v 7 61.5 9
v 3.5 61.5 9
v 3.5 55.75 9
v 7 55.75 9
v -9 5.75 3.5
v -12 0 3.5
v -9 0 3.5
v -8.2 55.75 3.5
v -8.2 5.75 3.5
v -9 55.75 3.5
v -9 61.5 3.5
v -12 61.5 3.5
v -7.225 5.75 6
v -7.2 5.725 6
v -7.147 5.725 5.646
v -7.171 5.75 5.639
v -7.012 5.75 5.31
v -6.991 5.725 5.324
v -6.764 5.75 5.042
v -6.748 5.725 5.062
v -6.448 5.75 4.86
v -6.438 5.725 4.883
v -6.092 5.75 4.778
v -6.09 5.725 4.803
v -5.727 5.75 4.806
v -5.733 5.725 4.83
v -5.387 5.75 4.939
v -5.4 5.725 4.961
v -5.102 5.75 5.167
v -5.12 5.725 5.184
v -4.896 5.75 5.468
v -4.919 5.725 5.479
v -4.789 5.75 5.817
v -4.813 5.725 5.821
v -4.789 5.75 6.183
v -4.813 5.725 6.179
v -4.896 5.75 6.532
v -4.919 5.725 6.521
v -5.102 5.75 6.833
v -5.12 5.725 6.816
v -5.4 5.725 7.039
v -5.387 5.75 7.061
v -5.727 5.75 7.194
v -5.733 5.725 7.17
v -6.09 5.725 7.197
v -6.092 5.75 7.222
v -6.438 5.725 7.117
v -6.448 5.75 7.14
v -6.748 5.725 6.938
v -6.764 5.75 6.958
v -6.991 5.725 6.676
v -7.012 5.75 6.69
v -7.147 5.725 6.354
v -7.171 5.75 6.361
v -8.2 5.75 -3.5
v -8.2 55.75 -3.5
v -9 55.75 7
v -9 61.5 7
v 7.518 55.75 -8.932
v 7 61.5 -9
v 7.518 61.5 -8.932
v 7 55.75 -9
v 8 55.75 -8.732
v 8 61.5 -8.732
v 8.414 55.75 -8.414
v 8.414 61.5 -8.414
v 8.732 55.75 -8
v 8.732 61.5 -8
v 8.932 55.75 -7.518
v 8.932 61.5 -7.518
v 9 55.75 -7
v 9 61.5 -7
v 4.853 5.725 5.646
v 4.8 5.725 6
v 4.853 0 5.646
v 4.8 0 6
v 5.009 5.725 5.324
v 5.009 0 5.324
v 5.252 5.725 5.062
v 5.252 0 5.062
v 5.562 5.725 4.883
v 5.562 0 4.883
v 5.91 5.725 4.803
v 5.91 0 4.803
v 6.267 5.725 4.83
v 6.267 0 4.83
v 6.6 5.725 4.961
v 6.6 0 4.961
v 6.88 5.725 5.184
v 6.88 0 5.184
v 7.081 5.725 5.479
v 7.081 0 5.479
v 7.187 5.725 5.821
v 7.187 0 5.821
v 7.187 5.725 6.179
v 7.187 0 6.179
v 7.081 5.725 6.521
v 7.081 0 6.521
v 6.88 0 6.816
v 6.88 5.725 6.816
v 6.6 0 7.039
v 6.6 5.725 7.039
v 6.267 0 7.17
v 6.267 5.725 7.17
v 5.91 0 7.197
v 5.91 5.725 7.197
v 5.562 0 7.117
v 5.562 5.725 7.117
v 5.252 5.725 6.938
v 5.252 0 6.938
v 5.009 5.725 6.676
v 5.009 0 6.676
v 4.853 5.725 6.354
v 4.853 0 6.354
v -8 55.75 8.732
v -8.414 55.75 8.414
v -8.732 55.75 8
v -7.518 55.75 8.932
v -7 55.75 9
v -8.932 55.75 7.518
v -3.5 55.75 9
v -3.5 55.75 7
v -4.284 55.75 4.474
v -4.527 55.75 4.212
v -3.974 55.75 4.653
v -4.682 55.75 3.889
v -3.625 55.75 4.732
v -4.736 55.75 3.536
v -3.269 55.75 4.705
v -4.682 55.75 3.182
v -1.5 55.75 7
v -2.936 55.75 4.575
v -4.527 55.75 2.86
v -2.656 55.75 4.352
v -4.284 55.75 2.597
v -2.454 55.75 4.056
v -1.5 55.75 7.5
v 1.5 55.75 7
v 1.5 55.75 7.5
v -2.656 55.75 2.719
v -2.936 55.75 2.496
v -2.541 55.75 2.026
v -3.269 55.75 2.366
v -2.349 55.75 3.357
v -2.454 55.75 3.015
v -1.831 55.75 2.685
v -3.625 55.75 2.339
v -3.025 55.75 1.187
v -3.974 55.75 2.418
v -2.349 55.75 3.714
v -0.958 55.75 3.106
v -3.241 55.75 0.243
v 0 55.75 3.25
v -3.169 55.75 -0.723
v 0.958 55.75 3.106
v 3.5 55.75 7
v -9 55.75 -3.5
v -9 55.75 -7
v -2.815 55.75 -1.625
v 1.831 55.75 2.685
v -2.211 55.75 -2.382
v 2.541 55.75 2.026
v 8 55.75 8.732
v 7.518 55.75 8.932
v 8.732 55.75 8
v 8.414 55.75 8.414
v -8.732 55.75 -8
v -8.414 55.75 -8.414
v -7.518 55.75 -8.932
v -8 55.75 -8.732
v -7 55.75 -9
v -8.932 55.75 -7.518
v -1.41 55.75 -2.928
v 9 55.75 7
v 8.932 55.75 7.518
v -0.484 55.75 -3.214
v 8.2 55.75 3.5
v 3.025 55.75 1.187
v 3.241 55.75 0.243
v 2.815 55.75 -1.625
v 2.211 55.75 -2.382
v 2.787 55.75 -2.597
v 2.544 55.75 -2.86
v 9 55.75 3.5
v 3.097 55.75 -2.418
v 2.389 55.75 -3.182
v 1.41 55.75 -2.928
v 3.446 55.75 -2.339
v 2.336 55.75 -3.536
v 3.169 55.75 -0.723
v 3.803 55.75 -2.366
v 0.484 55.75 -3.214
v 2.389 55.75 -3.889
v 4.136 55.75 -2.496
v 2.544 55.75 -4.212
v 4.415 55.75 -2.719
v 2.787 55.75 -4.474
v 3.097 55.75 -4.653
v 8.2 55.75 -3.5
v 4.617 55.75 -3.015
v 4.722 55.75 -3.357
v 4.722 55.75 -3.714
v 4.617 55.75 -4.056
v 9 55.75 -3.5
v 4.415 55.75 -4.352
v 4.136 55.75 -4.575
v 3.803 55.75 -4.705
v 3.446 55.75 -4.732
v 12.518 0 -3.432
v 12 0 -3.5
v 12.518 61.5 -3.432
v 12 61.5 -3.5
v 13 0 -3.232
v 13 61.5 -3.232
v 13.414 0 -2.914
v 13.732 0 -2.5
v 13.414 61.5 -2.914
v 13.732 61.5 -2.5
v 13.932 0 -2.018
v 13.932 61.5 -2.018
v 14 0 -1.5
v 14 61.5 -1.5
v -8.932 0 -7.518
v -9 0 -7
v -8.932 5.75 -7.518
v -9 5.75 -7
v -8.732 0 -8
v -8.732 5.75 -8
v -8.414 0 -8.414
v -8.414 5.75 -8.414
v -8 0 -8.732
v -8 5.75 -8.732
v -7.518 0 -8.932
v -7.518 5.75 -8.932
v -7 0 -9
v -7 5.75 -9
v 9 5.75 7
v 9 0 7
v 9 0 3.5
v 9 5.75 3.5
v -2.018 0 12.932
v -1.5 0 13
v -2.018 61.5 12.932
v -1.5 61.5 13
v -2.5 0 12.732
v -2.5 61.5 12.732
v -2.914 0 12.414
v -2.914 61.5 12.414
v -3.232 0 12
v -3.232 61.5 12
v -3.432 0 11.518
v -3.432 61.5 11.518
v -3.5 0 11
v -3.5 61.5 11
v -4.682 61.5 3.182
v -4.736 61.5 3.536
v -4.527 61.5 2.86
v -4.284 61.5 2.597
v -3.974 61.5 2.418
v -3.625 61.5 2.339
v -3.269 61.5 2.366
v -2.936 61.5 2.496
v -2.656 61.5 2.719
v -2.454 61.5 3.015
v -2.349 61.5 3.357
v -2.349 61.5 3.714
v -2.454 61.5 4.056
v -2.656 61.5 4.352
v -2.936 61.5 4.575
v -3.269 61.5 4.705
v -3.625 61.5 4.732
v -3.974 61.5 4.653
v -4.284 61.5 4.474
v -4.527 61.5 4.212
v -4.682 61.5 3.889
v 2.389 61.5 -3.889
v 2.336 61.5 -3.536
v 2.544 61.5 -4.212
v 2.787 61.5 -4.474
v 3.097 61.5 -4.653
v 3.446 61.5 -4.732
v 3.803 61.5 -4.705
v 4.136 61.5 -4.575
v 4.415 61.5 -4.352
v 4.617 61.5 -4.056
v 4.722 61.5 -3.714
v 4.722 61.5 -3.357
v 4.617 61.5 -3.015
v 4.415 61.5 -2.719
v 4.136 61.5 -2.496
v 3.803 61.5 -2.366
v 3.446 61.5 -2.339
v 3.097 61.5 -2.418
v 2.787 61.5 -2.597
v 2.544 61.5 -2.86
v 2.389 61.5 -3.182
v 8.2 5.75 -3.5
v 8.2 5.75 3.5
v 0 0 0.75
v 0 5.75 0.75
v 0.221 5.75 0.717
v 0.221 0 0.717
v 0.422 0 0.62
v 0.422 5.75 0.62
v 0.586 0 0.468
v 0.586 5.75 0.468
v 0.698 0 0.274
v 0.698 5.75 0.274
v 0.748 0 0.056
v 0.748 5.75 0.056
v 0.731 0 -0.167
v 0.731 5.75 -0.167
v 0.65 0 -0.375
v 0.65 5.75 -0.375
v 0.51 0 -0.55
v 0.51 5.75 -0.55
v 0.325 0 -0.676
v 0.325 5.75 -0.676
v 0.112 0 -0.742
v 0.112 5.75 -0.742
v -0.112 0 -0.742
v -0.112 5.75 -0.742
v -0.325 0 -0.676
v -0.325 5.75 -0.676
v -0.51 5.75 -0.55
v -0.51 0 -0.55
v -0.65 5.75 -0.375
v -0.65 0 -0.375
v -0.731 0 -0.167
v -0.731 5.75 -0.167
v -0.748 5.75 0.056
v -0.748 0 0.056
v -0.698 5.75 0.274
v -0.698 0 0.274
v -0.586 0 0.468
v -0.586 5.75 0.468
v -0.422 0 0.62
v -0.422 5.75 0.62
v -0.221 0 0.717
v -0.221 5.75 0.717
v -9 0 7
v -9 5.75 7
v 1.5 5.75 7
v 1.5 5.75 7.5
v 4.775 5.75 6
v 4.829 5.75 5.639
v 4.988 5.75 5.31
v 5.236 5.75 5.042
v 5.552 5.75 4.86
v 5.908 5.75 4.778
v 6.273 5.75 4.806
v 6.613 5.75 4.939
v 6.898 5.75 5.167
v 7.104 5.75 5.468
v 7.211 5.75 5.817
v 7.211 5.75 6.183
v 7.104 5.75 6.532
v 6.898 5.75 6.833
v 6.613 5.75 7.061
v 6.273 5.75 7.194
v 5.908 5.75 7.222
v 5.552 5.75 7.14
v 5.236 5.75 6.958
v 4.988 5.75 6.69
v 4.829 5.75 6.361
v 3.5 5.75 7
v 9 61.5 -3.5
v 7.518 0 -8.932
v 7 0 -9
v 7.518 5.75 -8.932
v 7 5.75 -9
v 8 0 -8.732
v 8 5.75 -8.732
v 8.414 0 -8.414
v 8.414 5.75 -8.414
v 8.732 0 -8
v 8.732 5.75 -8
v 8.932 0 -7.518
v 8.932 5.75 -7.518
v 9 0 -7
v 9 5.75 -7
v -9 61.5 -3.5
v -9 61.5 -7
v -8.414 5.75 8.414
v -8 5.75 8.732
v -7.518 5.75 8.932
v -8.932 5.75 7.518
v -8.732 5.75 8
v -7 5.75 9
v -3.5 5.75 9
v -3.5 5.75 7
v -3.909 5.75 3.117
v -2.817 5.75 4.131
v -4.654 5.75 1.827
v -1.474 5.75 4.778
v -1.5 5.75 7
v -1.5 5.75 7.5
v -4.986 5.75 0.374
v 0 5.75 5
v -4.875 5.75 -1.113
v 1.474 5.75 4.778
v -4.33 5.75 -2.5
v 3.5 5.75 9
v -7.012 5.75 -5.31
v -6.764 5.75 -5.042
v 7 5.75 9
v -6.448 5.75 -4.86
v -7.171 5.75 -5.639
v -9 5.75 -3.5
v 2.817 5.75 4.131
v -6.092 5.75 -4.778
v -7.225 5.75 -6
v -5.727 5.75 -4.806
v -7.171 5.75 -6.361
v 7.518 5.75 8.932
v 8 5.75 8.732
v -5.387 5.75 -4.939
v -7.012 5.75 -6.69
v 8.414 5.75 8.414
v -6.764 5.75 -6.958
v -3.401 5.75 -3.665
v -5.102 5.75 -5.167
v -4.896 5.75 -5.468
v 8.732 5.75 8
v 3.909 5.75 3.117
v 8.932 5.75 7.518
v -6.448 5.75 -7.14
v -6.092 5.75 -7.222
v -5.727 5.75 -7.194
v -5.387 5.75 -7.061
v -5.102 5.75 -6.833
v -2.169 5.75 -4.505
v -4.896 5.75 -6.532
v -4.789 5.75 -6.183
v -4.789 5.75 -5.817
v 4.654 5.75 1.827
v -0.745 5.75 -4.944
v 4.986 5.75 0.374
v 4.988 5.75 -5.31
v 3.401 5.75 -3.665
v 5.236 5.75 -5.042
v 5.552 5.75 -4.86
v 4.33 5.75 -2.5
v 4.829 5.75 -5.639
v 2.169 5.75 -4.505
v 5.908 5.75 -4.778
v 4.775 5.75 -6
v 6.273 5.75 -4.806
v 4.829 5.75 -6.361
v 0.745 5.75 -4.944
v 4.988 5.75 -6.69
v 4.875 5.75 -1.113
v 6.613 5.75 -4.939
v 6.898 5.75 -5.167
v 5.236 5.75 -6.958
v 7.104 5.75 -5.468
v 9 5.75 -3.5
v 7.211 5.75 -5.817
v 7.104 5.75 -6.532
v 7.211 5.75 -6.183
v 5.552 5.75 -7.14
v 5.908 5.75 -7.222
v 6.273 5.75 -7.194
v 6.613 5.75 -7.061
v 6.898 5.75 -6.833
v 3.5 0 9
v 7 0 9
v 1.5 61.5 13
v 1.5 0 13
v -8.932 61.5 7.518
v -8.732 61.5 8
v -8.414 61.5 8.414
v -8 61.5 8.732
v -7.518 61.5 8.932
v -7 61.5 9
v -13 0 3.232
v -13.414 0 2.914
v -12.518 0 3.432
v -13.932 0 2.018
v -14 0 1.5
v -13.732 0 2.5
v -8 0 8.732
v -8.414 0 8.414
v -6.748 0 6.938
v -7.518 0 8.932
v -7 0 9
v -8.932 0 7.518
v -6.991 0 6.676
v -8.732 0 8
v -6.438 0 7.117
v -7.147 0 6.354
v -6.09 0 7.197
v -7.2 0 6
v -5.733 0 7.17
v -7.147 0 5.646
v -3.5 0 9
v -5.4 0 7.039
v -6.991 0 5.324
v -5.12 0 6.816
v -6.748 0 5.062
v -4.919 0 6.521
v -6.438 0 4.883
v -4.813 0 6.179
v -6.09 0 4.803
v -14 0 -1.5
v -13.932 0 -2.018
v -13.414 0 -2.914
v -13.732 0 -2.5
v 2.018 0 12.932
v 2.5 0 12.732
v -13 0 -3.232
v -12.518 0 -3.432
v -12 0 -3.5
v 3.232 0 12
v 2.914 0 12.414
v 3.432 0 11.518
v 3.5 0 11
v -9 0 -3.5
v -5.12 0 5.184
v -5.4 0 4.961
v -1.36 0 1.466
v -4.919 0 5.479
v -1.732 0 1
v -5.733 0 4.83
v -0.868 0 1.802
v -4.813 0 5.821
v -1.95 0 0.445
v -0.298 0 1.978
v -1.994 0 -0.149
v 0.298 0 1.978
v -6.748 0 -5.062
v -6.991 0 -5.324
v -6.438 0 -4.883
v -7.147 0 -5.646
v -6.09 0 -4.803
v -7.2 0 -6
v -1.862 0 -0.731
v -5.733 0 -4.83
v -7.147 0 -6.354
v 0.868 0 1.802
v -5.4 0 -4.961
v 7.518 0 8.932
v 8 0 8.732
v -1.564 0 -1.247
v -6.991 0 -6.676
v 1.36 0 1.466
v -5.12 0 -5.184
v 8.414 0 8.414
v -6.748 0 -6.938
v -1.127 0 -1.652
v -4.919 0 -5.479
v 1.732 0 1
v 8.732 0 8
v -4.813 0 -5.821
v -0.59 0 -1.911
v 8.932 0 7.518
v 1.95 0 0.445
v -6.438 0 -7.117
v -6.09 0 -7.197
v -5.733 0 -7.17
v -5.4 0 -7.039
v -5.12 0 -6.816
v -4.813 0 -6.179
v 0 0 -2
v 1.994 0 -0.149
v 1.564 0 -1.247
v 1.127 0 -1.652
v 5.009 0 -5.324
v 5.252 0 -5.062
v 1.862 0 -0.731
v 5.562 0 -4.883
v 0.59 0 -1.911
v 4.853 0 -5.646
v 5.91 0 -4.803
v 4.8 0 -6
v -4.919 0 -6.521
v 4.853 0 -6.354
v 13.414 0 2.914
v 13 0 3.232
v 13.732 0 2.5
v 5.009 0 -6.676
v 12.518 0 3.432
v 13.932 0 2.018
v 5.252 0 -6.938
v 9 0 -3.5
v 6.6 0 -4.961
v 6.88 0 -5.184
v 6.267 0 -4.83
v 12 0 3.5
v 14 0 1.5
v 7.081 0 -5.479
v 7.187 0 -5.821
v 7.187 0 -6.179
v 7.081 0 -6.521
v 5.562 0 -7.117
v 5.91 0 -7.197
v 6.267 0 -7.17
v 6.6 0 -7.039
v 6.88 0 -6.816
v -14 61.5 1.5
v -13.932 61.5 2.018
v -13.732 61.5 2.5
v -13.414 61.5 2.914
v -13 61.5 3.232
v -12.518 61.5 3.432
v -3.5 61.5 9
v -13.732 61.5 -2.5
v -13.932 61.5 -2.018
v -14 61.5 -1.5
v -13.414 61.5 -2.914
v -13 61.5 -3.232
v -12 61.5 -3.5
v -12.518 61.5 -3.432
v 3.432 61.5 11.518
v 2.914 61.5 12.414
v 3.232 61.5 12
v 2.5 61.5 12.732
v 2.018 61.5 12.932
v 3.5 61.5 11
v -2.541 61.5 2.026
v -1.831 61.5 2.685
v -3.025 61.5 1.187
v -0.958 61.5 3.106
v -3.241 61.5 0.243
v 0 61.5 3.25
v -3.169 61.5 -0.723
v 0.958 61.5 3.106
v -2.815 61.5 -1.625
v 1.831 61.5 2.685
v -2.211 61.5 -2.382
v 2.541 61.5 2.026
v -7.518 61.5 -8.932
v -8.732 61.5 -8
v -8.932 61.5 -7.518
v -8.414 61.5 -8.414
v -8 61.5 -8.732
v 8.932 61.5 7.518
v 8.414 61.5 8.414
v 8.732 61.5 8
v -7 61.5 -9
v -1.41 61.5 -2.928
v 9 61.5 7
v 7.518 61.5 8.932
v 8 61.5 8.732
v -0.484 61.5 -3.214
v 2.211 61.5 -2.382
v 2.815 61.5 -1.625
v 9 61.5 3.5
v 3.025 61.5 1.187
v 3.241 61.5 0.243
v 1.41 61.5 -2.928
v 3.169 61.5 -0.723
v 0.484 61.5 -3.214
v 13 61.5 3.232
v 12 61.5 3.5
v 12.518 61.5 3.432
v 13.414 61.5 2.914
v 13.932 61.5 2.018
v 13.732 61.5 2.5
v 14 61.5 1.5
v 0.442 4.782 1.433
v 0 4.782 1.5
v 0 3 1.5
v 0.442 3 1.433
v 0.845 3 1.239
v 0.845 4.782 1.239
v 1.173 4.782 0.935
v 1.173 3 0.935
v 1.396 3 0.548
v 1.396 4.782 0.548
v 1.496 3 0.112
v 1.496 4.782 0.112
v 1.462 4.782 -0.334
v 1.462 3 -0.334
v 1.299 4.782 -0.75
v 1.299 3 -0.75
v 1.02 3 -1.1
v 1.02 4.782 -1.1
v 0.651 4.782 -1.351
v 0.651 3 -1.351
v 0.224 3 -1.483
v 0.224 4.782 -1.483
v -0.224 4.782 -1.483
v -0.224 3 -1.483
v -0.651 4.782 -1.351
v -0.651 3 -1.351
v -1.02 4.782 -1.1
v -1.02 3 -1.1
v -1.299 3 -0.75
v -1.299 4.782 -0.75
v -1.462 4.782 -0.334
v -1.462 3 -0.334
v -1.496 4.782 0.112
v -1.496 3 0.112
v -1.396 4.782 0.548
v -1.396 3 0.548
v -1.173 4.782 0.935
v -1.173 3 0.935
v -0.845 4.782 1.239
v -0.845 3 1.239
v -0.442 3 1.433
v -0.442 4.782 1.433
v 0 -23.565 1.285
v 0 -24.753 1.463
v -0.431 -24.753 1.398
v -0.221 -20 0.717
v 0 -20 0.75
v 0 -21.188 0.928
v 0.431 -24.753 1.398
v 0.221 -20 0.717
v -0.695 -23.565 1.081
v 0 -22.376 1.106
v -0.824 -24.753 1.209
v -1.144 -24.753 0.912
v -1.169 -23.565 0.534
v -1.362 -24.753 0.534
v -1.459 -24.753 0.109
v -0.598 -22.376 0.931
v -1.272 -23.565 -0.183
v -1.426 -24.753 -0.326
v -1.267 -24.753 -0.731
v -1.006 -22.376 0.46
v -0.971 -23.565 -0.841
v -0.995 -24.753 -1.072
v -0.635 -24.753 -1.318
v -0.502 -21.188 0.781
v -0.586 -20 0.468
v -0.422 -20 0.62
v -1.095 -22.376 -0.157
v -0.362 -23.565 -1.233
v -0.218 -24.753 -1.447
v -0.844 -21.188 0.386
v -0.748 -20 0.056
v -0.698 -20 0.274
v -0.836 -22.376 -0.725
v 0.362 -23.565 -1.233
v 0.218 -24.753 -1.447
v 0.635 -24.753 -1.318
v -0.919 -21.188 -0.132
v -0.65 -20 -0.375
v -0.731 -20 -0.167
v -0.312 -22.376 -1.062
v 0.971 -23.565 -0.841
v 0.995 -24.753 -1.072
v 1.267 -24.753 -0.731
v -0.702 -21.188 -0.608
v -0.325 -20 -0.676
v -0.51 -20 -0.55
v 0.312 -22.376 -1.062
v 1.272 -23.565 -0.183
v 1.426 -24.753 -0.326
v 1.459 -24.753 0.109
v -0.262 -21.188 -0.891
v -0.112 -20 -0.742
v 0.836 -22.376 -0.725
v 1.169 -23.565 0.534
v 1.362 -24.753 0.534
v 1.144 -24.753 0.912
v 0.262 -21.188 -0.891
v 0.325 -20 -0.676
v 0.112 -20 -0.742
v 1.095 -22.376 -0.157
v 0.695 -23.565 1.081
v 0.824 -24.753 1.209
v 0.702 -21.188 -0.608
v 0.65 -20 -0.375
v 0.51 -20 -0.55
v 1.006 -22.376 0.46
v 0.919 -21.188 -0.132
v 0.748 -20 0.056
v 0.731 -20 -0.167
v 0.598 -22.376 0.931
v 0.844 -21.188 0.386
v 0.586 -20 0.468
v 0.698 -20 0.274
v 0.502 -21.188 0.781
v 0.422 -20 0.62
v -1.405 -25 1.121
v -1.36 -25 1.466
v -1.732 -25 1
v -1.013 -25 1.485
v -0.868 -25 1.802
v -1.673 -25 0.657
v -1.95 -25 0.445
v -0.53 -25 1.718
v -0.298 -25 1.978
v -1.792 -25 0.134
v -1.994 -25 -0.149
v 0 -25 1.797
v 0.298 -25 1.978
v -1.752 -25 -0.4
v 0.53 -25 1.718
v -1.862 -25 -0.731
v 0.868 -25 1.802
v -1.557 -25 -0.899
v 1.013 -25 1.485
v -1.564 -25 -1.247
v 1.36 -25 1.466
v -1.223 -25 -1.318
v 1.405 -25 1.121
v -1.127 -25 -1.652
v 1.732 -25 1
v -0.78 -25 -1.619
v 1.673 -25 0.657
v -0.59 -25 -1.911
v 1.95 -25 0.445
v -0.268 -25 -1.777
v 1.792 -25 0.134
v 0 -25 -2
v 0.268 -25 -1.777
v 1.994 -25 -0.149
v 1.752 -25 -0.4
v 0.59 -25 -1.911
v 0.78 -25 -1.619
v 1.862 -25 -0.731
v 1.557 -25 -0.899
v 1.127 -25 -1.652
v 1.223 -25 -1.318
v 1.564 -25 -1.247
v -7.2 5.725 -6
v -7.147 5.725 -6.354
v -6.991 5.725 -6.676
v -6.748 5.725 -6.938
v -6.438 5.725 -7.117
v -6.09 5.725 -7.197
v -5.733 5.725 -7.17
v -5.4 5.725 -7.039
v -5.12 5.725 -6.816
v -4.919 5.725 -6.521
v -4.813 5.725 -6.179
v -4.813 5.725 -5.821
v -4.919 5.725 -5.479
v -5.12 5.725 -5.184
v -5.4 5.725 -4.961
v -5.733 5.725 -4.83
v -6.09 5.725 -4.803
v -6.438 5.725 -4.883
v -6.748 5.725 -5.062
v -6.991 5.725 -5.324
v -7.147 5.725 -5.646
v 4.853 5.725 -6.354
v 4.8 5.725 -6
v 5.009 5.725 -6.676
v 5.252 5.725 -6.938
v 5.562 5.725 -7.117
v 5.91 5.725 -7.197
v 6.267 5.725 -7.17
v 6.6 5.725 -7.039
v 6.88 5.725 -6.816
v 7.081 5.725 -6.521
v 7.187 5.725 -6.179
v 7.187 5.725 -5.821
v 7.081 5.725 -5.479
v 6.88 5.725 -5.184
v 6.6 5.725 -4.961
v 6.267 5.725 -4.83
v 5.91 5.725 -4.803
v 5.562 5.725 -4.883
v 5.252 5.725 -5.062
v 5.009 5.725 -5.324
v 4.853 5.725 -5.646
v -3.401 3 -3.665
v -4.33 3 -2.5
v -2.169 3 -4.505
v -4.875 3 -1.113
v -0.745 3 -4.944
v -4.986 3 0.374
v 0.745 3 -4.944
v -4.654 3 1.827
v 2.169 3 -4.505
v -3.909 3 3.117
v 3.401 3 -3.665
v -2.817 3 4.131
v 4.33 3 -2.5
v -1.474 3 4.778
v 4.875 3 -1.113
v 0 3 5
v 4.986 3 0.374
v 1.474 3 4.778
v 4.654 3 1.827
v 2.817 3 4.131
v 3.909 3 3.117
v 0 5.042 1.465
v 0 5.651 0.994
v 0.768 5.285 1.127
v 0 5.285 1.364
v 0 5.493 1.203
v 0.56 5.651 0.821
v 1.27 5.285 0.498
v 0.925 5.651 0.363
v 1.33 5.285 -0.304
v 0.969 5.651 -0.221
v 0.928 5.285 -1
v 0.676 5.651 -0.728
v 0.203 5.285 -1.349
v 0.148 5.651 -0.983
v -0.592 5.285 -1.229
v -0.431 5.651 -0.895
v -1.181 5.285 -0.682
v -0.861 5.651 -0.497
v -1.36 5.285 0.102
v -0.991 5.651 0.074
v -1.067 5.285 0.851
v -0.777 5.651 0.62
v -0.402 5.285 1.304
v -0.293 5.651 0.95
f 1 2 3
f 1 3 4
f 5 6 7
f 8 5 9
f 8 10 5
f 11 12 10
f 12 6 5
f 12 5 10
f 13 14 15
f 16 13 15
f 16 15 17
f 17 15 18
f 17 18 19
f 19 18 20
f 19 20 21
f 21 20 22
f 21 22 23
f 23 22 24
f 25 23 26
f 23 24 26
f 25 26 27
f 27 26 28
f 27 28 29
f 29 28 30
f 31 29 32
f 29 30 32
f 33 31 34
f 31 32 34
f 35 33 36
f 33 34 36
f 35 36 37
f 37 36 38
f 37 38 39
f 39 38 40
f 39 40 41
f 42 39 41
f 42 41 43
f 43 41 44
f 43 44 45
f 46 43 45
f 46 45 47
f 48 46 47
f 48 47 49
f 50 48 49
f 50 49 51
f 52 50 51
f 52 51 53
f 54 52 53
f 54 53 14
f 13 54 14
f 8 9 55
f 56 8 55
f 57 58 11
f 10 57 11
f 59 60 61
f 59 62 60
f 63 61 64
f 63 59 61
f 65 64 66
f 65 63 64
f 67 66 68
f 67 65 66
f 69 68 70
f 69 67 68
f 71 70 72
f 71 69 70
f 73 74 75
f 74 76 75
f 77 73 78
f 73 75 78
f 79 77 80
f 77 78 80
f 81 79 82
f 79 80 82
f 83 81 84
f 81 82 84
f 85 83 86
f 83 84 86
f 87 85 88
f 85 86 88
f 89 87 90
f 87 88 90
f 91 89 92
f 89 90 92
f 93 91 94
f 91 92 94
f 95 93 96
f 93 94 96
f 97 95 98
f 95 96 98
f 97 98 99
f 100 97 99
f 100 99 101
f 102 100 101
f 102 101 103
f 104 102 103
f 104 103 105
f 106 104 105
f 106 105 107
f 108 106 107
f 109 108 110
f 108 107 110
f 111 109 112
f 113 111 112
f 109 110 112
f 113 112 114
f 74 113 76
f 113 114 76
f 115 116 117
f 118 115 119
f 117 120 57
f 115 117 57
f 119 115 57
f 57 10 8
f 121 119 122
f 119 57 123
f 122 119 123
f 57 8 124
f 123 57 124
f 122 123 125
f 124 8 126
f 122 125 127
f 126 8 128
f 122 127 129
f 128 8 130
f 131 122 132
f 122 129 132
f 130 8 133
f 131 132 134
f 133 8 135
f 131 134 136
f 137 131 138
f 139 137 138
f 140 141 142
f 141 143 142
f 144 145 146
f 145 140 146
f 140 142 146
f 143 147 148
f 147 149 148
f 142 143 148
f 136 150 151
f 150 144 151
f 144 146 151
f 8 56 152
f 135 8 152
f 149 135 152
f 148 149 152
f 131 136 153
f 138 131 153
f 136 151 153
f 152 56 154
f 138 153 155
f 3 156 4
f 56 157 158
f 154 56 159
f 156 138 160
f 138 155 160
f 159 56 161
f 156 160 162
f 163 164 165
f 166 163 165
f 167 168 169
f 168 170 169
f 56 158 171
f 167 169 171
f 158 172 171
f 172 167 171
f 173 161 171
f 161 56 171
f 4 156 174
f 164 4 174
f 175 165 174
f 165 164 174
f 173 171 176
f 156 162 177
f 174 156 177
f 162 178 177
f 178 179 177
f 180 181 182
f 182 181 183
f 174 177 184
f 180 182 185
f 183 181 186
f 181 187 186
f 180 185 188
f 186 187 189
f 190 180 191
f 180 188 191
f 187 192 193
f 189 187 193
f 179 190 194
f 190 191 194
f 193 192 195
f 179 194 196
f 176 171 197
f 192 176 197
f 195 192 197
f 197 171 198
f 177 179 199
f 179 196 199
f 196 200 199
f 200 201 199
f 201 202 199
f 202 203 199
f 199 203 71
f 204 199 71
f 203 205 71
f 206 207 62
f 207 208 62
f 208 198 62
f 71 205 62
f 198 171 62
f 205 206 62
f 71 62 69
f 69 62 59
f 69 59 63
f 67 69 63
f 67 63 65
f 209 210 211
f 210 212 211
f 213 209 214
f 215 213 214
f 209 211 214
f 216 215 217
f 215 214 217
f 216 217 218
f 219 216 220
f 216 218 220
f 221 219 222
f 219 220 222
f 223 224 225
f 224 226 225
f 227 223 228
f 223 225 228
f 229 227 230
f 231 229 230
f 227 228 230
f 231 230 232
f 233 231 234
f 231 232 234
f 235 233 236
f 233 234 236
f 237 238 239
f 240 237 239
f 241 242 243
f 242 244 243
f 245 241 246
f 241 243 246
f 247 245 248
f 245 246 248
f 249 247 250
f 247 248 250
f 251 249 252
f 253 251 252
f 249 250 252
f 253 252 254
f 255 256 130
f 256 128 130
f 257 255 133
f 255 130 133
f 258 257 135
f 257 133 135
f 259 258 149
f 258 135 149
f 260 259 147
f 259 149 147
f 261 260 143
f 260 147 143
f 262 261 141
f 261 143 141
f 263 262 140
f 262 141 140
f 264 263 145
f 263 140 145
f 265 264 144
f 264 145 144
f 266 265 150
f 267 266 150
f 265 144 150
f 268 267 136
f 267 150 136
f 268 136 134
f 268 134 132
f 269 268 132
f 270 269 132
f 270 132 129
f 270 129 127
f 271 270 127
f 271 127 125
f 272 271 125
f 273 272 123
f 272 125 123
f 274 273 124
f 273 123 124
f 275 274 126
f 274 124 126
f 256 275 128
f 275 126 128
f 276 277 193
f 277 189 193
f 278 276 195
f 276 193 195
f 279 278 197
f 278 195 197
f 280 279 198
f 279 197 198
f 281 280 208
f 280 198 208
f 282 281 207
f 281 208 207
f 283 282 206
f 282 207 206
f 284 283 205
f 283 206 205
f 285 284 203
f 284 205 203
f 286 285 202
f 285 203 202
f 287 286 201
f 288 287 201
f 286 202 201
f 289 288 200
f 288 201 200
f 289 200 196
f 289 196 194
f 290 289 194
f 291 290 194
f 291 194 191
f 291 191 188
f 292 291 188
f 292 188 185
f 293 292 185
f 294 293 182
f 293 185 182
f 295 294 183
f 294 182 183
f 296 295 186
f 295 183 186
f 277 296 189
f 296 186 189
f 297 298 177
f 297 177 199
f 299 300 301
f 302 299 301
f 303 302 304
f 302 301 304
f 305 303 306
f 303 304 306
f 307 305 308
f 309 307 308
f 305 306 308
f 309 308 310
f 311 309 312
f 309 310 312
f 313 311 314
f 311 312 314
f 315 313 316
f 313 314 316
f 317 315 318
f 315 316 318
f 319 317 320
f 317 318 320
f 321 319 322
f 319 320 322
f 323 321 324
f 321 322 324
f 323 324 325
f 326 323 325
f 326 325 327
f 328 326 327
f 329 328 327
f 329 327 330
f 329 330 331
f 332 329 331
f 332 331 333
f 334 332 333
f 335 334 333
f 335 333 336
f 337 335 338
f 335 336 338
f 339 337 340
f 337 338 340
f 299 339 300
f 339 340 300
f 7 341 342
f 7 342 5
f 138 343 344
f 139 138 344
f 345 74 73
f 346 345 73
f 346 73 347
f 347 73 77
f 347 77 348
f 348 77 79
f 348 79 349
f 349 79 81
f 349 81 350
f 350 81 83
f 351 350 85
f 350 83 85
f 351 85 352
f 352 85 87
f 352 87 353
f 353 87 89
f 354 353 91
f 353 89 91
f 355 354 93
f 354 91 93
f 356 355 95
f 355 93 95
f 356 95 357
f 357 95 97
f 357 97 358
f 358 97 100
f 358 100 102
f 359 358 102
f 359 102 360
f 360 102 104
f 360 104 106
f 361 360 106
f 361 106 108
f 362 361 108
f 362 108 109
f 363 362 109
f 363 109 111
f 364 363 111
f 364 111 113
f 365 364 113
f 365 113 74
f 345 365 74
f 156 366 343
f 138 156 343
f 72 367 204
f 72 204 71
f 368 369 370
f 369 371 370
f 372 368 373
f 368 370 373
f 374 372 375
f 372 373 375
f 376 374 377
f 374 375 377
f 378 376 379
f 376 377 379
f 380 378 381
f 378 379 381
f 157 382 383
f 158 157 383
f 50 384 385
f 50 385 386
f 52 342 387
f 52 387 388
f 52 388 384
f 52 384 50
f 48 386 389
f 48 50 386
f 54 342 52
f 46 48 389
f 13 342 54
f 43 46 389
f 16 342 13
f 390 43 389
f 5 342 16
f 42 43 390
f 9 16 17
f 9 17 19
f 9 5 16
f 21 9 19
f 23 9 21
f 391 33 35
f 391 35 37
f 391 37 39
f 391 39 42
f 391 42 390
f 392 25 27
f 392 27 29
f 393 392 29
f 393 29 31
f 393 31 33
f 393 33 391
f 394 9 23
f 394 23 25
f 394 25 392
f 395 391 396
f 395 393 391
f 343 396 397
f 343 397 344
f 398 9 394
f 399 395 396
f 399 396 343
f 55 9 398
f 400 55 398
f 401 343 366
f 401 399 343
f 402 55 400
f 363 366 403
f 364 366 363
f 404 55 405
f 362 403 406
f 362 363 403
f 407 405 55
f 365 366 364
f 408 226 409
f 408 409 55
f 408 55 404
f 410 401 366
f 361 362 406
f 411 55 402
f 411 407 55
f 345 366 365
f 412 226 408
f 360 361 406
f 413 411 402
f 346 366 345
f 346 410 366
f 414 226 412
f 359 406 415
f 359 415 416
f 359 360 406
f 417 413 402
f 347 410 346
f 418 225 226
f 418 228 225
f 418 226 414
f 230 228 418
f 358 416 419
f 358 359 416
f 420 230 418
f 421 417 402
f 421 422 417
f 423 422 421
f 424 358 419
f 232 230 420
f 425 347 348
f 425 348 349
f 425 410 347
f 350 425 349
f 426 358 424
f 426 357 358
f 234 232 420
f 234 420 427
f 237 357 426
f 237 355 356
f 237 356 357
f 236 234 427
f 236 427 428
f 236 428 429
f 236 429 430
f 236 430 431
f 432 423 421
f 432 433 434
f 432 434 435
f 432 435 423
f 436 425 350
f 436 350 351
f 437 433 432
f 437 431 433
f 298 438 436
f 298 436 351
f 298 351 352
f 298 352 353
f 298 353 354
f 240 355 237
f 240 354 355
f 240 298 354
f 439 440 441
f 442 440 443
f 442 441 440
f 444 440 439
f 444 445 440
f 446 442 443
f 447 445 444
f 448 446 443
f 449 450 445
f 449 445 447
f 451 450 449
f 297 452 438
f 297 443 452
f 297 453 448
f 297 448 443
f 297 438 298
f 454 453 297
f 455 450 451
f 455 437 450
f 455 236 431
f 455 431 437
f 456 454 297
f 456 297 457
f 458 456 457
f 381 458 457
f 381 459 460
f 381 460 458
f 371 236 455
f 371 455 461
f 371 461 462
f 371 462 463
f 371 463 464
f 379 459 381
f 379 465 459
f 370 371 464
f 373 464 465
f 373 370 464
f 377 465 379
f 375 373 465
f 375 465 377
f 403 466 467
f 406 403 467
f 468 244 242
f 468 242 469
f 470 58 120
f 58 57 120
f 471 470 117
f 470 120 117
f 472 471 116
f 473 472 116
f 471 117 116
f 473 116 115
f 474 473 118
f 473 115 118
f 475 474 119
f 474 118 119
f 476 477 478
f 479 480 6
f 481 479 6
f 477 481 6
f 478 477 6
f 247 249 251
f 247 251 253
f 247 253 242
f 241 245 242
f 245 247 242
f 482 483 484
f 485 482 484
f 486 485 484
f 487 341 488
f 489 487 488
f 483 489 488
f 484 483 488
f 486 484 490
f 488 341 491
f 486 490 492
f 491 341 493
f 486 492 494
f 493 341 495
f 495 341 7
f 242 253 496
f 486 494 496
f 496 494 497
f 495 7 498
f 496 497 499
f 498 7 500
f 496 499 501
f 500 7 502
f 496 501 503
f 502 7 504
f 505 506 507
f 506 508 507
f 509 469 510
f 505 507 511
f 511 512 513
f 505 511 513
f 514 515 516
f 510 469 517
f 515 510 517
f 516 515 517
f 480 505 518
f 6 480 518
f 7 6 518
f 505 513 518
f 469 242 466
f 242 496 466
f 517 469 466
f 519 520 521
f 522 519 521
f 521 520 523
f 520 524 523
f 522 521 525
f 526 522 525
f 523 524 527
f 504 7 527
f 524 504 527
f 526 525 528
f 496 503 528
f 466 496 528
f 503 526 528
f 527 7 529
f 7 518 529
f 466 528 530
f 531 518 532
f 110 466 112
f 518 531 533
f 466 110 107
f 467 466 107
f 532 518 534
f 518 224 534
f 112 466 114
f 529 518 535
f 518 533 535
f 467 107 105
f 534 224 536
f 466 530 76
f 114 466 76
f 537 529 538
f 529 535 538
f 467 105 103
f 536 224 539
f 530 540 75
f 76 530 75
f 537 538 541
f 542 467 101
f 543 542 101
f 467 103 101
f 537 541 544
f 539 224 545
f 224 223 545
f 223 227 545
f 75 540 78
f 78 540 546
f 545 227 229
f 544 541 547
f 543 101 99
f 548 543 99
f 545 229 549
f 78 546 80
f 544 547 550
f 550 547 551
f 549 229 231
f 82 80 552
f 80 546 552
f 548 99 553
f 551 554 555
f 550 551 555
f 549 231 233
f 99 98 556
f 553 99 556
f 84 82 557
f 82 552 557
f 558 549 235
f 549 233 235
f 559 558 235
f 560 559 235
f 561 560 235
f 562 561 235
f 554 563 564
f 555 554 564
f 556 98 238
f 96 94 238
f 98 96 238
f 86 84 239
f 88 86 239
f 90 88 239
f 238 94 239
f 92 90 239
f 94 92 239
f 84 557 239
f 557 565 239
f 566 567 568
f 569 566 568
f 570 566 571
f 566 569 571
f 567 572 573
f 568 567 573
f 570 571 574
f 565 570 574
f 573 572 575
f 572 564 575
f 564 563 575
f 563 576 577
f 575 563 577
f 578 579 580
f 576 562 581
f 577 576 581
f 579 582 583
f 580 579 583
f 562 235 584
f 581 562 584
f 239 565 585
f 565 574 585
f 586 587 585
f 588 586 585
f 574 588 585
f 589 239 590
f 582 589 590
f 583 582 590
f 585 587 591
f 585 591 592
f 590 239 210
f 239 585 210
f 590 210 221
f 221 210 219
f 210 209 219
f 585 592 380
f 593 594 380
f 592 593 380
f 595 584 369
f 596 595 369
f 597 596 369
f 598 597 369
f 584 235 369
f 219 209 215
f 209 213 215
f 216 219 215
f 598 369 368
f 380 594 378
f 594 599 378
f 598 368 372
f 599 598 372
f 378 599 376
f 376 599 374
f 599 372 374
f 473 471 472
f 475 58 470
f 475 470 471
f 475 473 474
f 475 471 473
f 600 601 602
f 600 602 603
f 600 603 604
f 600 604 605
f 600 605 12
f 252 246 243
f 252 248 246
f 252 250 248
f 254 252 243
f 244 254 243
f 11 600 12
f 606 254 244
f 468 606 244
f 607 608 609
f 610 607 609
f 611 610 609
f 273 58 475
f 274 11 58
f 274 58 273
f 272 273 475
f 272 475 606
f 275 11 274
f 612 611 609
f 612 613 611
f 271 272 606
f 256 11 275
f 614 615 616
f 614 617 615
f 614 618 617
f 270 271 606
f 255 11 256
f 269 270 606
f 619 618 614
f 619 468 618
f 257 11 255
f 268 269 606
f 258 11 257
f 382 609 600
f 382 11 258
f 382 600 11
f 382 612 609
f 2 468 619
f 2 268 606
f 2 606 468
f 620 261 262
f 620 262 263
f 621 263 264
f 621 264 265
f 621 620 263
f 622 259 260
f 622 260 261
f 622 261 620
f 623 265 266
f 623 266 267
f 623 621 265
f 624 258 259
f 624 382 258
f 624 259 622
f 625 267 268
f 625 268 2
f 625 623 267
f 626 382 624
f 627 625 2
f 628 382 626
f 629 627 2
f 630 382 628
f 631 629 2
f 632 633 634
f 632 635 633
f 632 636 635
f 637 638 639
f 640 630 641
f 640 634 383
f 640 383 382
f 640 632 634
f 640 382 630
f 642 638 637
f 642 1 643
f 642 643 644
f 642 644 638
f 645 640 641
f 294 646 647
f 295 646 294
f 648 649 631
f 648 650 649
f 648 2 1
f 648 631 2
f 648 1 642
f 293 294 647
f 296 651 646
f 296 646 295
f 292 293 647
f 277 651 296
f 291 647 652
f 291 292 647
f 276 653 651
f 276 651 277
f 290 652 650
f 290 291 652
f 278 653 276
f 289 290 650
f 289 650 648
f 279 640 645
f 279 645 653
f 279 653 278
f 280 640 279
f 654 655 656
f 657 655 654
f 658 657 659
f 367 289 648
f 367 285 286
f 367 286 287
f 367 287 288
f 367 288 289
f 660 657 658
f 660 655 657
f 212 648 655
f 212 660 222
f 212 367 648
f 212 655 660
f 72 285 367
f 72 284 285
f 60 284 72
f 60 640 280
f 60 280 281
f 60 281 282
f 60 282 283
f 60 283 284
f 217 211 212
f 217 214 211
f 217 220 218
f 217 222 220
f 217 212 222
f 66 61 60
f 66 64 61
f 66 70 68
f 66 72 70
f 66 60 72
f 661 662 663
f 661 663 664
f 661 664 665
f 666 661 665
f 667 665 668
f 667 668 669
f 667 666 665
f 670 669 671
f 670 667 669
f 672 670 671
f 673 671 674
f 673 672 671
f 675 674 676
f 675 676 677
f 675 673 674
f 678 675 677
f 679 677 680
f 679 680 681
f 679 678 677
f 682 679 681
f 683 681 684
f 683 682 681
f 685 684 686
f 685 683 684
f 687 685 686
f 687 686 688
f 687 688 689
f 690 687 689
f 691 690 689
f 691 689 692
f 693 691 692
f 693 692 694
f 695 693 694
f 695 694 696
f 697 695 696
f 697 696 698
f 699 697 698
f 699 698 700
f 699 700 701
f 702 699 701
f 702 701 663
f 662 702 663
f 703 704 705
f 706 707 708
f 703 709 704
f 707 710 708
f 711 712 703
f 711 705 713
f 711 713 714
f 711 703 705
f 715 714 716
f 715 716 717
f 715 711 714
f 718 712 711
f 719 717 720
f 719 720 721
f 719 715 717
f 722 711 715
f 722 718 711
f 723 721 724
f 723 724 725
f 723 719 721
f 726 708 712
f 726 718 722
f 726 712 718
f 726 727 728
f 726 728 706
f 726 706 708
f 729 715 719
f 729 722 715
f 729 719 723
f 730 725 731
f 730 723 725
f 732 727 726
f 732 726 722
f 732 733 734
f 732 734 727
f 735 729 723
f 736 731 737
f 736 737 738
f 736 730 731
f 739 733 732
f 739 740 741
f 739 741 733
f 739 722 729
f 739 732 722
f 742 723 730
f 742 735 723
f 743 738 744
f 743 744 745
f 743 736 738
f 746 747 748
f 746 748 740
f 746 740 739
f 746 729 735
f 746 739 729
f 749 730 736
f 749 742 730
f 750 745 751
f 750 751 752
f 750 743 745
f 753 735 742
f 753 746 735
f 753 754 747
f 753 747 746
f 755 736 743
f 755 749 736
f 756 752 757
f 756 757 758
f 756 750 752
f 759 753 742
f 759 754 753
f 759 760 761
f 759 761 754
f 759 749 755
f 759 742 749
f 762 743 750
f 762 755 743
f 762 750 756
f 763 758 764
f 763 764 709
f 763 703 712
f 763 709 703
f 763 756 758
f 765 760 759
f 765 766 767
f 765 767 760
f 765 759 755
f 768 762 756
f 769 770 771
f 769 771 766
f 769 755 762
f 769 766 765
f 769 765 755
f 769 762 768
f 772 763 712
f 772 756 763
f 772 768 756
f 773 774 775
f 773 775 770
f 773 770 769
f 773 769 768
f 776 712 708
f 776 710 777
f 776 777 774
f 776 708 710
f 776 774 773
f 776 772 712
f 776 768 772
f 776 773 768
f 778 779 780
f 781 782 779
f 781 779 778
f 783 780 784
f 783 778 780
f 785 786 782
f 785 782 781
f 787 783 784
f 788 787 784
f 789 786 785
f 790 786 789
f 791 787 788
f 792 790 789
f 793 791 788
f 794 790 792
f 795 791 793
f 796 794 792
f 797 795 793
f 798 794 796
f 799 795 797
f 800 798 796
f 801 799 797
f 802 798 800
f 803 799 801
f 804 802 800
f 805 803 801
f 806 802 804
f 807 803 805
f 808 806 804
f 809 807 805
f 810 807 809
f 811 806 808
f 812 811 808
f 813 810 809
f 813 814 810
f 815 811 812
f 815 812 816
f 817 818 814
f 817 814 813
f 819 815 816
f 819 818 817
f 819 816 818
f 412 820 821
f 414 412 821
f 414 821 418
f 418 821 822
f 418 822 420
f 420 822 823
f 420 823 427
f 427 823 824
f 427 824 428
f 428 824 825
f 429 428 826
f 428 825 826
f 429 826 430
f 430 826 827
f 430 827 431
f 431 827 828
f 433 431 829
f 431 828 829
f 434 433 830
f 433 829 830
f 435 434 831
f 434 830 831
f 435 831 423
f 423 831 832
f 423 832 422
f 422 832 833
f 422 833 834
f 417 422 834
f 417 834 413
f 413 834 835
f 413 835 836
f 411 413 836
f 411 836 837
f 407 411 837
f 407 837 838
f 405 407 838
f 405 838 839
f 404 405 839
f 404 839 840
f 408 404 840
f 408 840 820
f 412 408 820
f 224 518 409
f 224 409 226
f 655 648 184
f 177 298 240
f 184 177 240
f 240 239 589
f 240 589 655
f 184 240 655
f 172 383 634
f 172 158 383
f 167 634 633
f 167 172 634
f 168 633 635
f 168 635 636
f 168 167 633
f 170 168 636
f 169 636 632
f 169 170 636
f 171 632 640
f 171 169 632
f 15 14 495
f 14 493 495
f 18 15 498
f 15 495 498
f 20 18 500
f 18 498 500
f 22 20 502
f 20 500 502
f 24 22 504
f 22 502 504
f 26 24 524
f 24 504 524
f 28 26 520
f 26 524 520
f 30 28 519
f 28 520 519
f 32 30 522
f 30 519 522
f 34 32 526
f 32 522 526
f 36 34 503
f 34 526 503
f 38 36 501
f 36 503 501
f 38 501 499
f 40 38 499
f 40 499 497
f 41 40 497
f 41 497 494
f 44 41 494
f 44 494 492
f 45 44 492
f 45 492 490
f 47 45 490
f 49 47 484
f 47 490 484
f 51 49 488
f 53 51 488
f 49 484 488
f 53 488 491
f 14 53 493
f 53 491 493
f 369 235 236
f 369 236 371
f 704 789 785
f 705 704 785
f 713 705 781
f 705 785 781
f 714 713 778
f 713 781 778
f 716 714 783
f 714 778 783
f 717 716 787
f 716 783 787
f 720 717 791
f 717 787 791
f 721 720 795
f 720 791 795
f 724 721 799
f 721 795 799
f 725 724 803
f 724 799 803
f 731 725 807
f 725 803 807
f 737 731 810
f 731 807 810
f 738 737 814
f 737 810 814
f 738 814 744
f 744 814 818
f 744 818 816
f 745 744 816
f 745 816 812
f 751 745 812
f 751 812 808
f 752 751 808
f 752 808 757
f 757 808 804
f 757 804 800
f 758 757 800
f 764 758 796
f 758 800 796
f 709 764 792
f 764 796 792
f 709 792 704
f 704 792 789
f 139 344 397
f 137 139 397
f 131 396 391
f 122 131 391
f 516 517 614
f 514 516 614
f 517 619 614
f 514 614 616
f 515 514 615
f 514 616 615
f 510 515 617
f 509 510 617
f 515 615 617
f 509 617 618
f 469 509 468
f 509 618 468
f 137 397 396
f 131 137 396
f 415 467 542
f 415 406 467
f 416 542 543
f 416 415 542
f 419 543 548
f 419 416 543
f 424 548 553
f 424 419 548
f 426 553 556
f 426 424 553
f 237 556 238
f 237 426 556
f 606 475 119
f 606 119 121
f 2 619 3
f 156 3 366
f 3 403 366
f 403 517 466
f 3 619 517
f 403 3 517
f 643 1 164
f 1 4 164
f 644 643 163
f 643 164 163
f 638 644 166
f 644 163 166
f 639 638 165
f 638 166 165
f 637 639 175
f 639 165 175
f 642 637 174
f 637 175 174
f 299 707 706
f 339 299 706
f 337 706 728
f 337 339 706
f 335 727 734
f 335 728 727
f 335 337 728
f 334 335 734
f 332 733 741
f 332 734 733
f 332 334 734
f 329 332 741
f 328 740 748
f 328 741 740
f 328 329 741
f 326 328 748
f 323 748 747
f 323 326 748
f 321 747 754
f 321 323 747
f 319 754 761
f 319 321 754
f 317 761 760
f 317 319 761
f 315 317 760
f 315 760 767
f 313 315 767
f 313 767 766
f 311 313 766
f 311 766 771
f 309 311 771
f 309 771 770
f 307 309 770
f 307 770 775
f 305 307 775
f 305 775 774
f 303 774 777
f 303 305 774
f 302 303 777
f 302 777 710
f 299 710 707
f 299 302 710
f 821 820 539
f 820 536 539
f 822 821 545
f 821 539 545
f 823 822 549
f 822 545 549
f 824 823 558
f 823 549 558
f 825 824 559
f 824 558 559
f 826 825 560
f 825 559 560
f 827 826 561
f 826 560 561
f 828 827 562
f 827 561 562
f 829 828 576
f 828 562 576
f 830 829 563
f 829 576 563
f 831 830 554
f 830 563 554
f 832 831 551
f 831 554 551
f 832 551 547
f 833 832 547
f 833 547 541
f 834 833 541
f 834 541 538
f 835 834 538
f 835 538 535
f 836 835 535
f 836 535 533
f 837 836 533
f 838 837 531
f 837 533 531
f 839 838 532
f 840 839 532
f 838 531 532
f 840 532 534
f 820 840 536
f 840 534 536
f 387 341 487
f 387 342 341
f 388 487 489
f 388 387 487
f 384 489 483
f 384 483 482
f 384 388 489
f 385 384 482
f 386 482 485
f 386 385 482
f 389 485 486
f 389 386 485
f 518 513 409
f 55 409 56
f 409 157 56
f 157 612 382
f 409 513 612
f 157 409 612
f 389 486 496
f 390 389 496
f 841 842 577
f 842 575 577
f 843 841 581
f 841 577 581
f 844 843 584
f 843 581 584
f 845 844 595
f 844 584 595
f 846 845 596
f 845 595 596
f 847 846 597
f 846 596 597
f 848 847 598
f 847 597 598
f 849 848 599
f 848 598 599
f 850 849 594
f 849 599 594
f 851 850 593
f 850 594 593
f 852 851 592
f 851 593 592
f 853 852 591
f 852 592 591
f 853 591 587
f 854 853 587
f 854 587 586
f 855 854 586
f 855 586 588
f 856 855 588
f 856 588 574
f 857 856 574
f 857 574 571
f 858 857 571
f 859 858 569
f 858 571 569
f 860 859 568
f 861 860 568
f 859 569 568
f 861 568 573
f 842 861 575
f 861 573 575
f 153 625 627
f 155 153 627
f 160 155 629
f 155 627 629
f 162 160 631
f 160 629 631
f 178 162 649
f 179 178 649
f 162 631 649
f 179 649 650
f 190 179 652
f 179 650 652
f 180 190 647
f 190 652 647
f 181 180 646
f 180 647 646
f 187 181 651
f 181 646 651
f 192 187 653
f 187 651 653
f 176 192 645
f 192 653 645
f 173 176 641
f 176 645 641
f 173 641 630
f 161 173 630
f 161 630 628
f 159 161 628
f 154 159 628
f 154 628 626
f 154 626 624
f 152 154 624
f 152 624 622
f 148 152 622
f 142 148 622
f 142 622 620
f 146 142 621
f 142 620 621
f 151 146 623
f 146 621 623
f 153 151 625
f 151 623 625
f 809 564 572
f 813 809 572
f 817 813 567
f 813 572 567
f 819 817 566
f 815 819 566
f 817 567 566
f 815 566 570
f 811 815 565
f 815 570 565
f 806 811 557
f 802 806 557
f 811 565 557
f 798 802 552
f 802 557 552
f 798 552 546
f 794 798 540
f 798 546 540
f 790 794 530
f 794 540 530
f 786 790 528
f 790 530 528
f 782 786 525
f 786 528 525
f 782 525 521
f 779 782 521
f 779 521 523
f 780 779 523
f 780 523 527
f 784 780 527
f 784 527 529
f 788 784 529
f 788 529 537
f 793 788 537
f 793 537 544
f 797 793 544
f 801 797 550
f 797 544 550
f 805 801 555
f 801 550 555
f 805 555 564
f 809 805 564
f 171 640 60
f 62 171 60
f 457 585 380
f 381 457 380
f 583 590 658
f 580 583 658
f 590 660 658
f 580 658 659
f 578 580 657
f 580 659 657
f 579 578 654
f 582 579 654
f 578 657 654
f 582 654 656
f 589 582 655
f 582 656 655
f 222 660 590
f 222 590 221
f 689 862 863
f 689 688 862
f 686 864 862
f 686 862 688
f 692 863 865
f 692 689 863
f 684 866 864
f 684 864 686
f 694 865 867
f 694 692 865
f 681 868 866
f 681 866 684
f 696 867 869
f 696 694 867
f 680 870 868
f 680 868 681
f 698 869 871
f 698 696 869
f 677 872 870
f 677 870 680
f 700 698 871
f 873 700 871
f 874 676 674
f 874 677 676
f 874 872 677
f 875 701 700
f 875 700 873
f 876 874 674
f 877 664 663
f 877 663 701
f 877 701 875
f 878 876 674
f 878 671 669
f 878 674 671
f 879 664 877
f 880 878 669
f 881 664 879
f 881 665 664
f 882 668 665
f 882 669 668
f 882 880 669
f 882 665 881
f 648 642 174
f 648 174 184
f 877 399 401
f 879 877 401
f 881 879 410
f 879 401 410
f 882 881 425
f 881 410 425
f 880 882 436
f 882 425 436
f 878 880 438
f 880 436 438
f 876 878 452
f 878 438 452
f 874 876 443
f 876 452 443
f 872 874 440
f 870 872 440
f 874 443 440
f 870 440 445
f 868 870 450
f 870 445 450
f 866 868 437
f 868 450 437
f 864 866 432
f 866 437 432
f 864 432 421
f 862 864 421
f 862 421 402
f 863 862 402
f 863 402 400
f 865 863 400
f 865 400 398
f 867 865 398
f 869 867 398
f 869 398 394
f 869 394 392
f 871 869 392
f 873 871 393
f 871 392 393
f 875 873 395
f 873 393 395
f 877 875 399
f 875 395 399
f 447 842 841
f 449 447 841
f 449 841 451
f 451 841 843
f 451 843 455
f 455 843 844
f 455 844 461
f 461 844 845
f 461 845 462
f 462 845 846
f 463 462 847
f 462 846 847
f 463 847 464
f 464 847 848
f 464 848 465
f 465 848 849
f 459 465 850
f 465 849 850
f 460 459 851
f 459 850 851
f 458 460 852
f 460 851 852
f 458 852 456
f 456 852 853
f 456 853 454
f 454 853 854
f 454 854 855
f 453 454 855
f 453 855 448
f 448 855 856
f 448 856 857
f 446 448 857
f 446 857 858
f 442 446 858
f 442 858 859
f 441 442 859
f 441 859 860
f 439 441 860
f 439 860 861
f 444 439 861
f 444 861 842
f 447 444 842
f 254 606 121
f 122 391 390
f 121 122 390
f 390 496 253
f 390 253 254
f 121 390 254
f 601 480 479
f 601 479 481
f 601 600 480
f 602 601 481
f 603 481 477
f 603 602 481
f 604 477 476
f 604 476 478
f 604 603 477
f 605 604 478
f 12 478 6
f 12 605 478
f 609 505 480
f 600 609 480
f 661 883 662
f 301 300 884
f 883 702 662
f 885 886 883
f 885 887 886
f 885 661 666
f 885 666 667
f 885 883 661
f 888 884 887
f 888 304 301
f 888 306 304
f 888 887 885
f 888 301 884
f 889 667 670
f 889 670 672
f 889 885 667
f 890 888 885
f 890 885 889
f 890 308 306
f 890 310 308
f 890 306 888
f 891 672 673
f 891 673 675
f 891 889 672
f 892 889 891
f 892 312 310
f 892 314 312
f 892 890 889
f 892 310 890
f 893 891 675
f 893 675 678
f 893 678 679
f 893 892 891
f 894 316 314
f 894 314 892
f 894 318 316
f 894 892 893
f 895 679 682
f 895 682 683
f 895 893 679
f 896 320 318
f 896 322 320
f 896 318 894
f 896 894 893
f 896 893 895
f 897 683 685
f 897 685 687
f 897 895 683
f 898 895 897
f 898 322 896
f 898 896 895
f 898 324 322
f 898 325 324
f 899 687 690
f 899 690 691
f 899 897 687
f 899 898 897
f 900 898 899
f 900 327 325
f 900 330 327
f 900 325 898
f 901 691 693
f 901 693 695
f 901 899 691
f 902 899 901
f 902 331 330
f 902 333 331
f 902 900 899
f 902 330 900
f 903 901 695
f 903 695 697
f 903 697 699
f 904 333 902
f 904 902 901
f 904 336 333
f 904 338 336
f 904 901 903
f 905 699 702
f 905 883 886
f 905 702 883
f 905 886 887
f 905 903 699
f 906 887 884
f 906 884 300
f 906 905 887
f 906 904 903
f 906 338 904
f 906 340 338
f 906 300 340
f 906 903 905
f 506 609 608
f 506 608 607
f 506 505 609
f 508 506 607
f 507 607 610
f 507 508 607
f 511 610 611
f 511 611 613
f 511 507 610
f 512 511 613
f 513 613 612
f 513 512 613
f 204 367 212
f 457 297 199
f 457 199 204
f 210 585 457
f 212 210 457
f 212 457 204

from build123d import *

# Parameters (mm, degrees)
SKETCH1_W                      = 18
SKETCH1_H                      = 18
BOSS_EXTRUDE1_DEPTH            = 5.75
M2_CLEARANCE_HOLE1_D           = 2.4
M2_CLEARANCE_HOLE1_CSINK_D     = 2.45
M2_CLEARANCE_HOLE1_CSINK_ANGLE = 90
SKETCH5_W                      = 5.8
SKETCH5_H                      = 7
BOSS_EXTRUDE2_DEPTH            = 50
SKETCH6_R                      = 4.0625
CUT_EXTRUDE1_DEPTH             = 5.75
SKETCH7_R                      = 3.25
CUT_EXTRUDE2_DEPTH             = 5.75
FILLET1_R                      = 2
M2_CLEARANCE_HOLE2_D           = 2.4
M2_CLEARANCE_HOLE2_DEPTH       = 5.75
M2_CLEARANCE_HOLE2_TIP         = 0.721032743
SKETCH11_W                     = 5
SKETCH11_H                     = 7
SKETCH11_W_2                   = 7
SKETCH11_H_2                   = 4
BOSS_EXTRUDE3_DEPTH            = 5.75
SKETCH12_W                     = 5
SKETCH12_H                     = 7
SKETCH12_W_2                   = 7
SKETCH12_H_2                   = 4
BOSS_EXTRUDE4_DEPTH            = 5.75
FILLET2_R                      = 2
SKETCH15_R                     = 4.0625
SKETCH15_R_2                   = 0.75
BOSS_EXTRUDE5_DEPTH            = 5.75
SKETCH16_R                     = 2
SKETCH16_R_2                   = 0.75
BOSS_EXTRUDE6_DEPTH            = 25
SKETCH17_R                     = 5
SKETCH17_R_2                   = 1.5
CUT_EXTRUDE3_DEPTH             = 2.75
CHAMFER1_SIZE                  = 0.25
CHAMFER1_SIZE2                 = 0.297408065
FILLET3_R                      = 1


with BuildPart() as part:
    # Sketch1 → Boss-Extrude1 (new body)
    with BuildSketch(Plane(origin=(0, 0, 0), x_dir=(1, 0, 0), z_dir=(0, 1, 0))):
        Rectangle(SKETCH1_W, SKETCH1_H)
    boss_extrude1 = extrude(amount=BOSS_EXTRUDE1_DEPTH)

    # M2 Clearance Hole1 (through all)
    with Locations(Plane(origin=(0, 5.75, 0), x_dir=(1, 0, 0), z_dir=(0, 1, 0))):
        with Locations((-6, 6), (6, 6), (-6, -6), (6, -6)):
            CounterSinkHole(M2_CLEARANCE_HOLE1_D / 2, M2_CLEARANCE_HOLE1_CSINK_D / 2, counter_sink_angle=M2_CLEARANCE_HOLE1_CSINK_ANGLE)

    # Sketch5 → Boss-Extrude2 (add)
    with BuildSketch(Plane(origin=(0, 5.75, 0), x_dir=(1, 0, 0), z_dir=(0, 1, 0))):
        with Locations((-11.1, 0)):
            Rectangle(SKETCH5_W, SKETCH5_H)
        with Locations((11.1, 0)):
            Rectangle(SKETCH5_W, SKETCH5_H)
        Polygon((3.5, -7), (1.5, -7), (1.5, -7.5), (-1.5, -7.5), (-1.5, -7), (-3.5, -7), (-3.5, -9), (-3.5, -13), (3.5, -13), (3.5, -9), align=None)
    extrude(amount=BOSS_EXTRUDE2_DEPTH)

    # Sketch6 → Cut-Extrude1 (cut)
    with BuildSketch(Plane(origin=(0, 5.75, 0), x_dir=(1, 0, 0), z_dir=(0, 1, 0))):
        with Locations(Location((0, 0, 0), (0, 0, 270))):
            Circle(SKETCH6_R)
    extrude(amount=-CUT_EXTRUDE1_DEPTH, mode=Mode.SUBTRACT)

    # Mirror1: Boss-Extrude1 across plane
    add(boss_extrude1.mirror(Plane.ZX.offset(30.75)))

    # Sketch7 → Cut-Extrude2 (cut)
    with BuildSketch(Plane(origin=(0, 61.5, 0), x_dir=(1, 0, 0), z_dir=(0, 1, 0))):
        with Locations(Location((0, 0, 0), (0, 0, 270))):
            Circle(SKETCH7_R)
    extrude(amount=-CUT_EXTRUDE2_DEPTH, mode=Mode.SUBTRACT)

    # Fillet1
    fillet1_edges = [part.edges().sort_by_distance(p)[0] for p in [
        (9, 58.625, -9),
        (9, 58.625, 9),
        (-9, 58.625, 9),
        (-9, 58.625, -9),
        (9, 2.875, 9),
        (-9, 2.875, 9),
        (-9, 2.875, -9),
        (9, 2.875, -9),
    ]]
    fillet(fillet1_edges, radius=FILLET1_R)

    # M2 Clearance Hole2
    with Locations(Plane(origin=(0, 61.5, 0), x_dir=(1, 0, 0), z_dir=(0, 1, 0))):
        with Locations((-3.535533906, -3.535533906), (3.535533906, 3.535533906)):
            Hole(M2_CLEARANCE_HOLE2_D / 2, depth=M2_CLEARANCE_HOLE2_DEPTH)
            with Locations((0, 0, -(M2_CLEARANCE_HOLE2_DEPTH + M2_CLEARANCE_HOLE2_TIP / 2))):  # 118° drill point
                Cone(0, M2_CLEARANCE_HOLE2_D / 2, M2_CLEARANCE_HOLE2_TIP, mode=Mode.SUBTRACT)

    # Sketch11 → Boss-Extrude3 (add)
    with BuildSketch(Plane(origin=(0, 55.75, 0), x_dir=(1, 0, 0), z_dir=(0, 1, 0))):
        with Locations((-11.5, 0)):
            Rectangle(SKETCH11_W, SKETCH11_H)
        with Locations((11.5, 0)):
            Rectangle(SKETCH11_W, SKETCH11_H)
        with Locations((0, -11)):
            Rectangle(SKETCH11_W_2, SKETCH11_H_2)
    extrude(amount=BOSS_EXTRUDE3_DEPTH)

    # Sketch12 → Boss-Extrude4 (add)
    with BuildSketch(Plane.XZ.offset(-5.75)):
        with Locations((-11.5, 0)):
            Rectangle(SKETCH12_W, SKETCH12_H)
        with Locations((0, 11)):
            Rectangle(SKETCH12_W_2, SKETCH12_H_2)
        with Locations((11.5, 0)):
            Rectangle(SKETCH12_W, SKETCH12_H)
    extrude(amount=BOSS_EXTRUDE4_DEPTH)

    # Fillet2
    fillet2_edges = [part.edges().sort_by_distance(p)[0] for p in [
        (-14, 30.75, -3.5),
        (-14, 30.75, 3.5),
        (-3.5, 30.75, 13),
        (3.5, 30.75, 13),
        (14, 30.75, -3.5),
        (14, 30.75, 3.5),
    ]]
    fillet(fillet2_edges, radius=FILLET2_R)

    # Sketch15 → Boss-Extrude5 (add)
    with BuildSketch(Plane(origin=(0, 5.75, 0), x_dir=(1, 0, 0), z_dir=(0, 1, 0))):
        Circle(SKETCH15_R)
        with Locations(Location((0, 0, 0), (0, 0, 270))):
            Circle(SKETCH15_R_2, mode=Mode.SUBTRACT)
    extrude(amount=-BOSS_EXTRUDE5_DEPTH)

    # Sketch16 → Boss-Extrude6 (add)
    with BuildSketch(Plane.XZ):
        with Locations(Location((0, 0, 0), (0, 0, 270))):
            Circle(SKETCH16_R)
        with Locations(Location((0, 0, 0), (0, 0, 90))):
            Circle(SKETCH16_R_2, mode=Mode.SUBTRACT)
    extrude(amount=BOSS_EXTRUDE6_DEPTH)

    # Sketch17 → Cut-Extrude3 (cut)
    with BuildSketch(Plane(origin=(0, 5.75, 0), x_dir=(1, 0, 0), z_dir=(0, 1, 0))):
        with Locations(Location((0, 0, 0), (0, 0, 270))):
            Circle(SKETCH17_R)
        with Locations(Location((0, 0, 0), (0, 0, 270))):
            Circle(SKETCH17_R_2, mode=Mode.SUBTRACT)
    extrude(amount=-CUT_EXTRUDE3_DEPTH, mode=Mode.SUBTRACT)

    # Sketch19 → Cut-Revolve1 (revolve, cut)
    with BuildSketch(Plane.XY, mode=Mode.PRIVATE) as cut_revolve1_sk:
        Polygon((0, -25), (-1.5, -25), (0, -15), align=None)
    revolve(cut_revolve1_sk.sketch.rotate(Axis((0, -15, 0), (0, -1, 0)), 270), axis=Axis((0, -15, 0), (0, -1, 0)), mode=Mode.SUBTRACT)

    # Chamfer1
    chamfer1_edges = [part.edges().sort_by_distance(p)[0] for p in [
        (0, -25, -1.5),
    ]]
    chamfer1_side = [part.faces().sort_by_distance(p)[0] for p in [
        (0, -22.5, -1.125),
    ]]
    chamfer(chamfer1_edges, length=CHAMFER1_SIZE, length2=CHAMFER1_SIZE2, reference=chamfer1_side[0])

    # Fillet3
    # the kernel refuses this fillet: 1 mm, written as the material it takes off along each edge
    with BuildSketch(Plane(origin=(0, 5.75, 0), x_dir=(0, 0, 1), z_dir=(-1, 0, 0))) as fillet3_piece_1:
        with BuildLine():
            CenterArc((0.5, -0.968245837), FILLET3_R, 0, 75.522487814)
            Line((1.5, -0.968245837), (1.52, -0.968245837))
            Line((1.52, -0.968245837), (1.52, 0))
            Line((1.52, 0), (1.5, 0.02))
            ThreePointArc((1.5, 0.02), (1.125, 0.02), (0.755, 0.019364917))
            Line((0.755, 0.019364917), (0.75, 0))
        make_face()
    revolve(axis=Axis((0, 5.75, 0), (0, 1, 0)), mode=Mode.SUBTRACT)


solid = part.part
